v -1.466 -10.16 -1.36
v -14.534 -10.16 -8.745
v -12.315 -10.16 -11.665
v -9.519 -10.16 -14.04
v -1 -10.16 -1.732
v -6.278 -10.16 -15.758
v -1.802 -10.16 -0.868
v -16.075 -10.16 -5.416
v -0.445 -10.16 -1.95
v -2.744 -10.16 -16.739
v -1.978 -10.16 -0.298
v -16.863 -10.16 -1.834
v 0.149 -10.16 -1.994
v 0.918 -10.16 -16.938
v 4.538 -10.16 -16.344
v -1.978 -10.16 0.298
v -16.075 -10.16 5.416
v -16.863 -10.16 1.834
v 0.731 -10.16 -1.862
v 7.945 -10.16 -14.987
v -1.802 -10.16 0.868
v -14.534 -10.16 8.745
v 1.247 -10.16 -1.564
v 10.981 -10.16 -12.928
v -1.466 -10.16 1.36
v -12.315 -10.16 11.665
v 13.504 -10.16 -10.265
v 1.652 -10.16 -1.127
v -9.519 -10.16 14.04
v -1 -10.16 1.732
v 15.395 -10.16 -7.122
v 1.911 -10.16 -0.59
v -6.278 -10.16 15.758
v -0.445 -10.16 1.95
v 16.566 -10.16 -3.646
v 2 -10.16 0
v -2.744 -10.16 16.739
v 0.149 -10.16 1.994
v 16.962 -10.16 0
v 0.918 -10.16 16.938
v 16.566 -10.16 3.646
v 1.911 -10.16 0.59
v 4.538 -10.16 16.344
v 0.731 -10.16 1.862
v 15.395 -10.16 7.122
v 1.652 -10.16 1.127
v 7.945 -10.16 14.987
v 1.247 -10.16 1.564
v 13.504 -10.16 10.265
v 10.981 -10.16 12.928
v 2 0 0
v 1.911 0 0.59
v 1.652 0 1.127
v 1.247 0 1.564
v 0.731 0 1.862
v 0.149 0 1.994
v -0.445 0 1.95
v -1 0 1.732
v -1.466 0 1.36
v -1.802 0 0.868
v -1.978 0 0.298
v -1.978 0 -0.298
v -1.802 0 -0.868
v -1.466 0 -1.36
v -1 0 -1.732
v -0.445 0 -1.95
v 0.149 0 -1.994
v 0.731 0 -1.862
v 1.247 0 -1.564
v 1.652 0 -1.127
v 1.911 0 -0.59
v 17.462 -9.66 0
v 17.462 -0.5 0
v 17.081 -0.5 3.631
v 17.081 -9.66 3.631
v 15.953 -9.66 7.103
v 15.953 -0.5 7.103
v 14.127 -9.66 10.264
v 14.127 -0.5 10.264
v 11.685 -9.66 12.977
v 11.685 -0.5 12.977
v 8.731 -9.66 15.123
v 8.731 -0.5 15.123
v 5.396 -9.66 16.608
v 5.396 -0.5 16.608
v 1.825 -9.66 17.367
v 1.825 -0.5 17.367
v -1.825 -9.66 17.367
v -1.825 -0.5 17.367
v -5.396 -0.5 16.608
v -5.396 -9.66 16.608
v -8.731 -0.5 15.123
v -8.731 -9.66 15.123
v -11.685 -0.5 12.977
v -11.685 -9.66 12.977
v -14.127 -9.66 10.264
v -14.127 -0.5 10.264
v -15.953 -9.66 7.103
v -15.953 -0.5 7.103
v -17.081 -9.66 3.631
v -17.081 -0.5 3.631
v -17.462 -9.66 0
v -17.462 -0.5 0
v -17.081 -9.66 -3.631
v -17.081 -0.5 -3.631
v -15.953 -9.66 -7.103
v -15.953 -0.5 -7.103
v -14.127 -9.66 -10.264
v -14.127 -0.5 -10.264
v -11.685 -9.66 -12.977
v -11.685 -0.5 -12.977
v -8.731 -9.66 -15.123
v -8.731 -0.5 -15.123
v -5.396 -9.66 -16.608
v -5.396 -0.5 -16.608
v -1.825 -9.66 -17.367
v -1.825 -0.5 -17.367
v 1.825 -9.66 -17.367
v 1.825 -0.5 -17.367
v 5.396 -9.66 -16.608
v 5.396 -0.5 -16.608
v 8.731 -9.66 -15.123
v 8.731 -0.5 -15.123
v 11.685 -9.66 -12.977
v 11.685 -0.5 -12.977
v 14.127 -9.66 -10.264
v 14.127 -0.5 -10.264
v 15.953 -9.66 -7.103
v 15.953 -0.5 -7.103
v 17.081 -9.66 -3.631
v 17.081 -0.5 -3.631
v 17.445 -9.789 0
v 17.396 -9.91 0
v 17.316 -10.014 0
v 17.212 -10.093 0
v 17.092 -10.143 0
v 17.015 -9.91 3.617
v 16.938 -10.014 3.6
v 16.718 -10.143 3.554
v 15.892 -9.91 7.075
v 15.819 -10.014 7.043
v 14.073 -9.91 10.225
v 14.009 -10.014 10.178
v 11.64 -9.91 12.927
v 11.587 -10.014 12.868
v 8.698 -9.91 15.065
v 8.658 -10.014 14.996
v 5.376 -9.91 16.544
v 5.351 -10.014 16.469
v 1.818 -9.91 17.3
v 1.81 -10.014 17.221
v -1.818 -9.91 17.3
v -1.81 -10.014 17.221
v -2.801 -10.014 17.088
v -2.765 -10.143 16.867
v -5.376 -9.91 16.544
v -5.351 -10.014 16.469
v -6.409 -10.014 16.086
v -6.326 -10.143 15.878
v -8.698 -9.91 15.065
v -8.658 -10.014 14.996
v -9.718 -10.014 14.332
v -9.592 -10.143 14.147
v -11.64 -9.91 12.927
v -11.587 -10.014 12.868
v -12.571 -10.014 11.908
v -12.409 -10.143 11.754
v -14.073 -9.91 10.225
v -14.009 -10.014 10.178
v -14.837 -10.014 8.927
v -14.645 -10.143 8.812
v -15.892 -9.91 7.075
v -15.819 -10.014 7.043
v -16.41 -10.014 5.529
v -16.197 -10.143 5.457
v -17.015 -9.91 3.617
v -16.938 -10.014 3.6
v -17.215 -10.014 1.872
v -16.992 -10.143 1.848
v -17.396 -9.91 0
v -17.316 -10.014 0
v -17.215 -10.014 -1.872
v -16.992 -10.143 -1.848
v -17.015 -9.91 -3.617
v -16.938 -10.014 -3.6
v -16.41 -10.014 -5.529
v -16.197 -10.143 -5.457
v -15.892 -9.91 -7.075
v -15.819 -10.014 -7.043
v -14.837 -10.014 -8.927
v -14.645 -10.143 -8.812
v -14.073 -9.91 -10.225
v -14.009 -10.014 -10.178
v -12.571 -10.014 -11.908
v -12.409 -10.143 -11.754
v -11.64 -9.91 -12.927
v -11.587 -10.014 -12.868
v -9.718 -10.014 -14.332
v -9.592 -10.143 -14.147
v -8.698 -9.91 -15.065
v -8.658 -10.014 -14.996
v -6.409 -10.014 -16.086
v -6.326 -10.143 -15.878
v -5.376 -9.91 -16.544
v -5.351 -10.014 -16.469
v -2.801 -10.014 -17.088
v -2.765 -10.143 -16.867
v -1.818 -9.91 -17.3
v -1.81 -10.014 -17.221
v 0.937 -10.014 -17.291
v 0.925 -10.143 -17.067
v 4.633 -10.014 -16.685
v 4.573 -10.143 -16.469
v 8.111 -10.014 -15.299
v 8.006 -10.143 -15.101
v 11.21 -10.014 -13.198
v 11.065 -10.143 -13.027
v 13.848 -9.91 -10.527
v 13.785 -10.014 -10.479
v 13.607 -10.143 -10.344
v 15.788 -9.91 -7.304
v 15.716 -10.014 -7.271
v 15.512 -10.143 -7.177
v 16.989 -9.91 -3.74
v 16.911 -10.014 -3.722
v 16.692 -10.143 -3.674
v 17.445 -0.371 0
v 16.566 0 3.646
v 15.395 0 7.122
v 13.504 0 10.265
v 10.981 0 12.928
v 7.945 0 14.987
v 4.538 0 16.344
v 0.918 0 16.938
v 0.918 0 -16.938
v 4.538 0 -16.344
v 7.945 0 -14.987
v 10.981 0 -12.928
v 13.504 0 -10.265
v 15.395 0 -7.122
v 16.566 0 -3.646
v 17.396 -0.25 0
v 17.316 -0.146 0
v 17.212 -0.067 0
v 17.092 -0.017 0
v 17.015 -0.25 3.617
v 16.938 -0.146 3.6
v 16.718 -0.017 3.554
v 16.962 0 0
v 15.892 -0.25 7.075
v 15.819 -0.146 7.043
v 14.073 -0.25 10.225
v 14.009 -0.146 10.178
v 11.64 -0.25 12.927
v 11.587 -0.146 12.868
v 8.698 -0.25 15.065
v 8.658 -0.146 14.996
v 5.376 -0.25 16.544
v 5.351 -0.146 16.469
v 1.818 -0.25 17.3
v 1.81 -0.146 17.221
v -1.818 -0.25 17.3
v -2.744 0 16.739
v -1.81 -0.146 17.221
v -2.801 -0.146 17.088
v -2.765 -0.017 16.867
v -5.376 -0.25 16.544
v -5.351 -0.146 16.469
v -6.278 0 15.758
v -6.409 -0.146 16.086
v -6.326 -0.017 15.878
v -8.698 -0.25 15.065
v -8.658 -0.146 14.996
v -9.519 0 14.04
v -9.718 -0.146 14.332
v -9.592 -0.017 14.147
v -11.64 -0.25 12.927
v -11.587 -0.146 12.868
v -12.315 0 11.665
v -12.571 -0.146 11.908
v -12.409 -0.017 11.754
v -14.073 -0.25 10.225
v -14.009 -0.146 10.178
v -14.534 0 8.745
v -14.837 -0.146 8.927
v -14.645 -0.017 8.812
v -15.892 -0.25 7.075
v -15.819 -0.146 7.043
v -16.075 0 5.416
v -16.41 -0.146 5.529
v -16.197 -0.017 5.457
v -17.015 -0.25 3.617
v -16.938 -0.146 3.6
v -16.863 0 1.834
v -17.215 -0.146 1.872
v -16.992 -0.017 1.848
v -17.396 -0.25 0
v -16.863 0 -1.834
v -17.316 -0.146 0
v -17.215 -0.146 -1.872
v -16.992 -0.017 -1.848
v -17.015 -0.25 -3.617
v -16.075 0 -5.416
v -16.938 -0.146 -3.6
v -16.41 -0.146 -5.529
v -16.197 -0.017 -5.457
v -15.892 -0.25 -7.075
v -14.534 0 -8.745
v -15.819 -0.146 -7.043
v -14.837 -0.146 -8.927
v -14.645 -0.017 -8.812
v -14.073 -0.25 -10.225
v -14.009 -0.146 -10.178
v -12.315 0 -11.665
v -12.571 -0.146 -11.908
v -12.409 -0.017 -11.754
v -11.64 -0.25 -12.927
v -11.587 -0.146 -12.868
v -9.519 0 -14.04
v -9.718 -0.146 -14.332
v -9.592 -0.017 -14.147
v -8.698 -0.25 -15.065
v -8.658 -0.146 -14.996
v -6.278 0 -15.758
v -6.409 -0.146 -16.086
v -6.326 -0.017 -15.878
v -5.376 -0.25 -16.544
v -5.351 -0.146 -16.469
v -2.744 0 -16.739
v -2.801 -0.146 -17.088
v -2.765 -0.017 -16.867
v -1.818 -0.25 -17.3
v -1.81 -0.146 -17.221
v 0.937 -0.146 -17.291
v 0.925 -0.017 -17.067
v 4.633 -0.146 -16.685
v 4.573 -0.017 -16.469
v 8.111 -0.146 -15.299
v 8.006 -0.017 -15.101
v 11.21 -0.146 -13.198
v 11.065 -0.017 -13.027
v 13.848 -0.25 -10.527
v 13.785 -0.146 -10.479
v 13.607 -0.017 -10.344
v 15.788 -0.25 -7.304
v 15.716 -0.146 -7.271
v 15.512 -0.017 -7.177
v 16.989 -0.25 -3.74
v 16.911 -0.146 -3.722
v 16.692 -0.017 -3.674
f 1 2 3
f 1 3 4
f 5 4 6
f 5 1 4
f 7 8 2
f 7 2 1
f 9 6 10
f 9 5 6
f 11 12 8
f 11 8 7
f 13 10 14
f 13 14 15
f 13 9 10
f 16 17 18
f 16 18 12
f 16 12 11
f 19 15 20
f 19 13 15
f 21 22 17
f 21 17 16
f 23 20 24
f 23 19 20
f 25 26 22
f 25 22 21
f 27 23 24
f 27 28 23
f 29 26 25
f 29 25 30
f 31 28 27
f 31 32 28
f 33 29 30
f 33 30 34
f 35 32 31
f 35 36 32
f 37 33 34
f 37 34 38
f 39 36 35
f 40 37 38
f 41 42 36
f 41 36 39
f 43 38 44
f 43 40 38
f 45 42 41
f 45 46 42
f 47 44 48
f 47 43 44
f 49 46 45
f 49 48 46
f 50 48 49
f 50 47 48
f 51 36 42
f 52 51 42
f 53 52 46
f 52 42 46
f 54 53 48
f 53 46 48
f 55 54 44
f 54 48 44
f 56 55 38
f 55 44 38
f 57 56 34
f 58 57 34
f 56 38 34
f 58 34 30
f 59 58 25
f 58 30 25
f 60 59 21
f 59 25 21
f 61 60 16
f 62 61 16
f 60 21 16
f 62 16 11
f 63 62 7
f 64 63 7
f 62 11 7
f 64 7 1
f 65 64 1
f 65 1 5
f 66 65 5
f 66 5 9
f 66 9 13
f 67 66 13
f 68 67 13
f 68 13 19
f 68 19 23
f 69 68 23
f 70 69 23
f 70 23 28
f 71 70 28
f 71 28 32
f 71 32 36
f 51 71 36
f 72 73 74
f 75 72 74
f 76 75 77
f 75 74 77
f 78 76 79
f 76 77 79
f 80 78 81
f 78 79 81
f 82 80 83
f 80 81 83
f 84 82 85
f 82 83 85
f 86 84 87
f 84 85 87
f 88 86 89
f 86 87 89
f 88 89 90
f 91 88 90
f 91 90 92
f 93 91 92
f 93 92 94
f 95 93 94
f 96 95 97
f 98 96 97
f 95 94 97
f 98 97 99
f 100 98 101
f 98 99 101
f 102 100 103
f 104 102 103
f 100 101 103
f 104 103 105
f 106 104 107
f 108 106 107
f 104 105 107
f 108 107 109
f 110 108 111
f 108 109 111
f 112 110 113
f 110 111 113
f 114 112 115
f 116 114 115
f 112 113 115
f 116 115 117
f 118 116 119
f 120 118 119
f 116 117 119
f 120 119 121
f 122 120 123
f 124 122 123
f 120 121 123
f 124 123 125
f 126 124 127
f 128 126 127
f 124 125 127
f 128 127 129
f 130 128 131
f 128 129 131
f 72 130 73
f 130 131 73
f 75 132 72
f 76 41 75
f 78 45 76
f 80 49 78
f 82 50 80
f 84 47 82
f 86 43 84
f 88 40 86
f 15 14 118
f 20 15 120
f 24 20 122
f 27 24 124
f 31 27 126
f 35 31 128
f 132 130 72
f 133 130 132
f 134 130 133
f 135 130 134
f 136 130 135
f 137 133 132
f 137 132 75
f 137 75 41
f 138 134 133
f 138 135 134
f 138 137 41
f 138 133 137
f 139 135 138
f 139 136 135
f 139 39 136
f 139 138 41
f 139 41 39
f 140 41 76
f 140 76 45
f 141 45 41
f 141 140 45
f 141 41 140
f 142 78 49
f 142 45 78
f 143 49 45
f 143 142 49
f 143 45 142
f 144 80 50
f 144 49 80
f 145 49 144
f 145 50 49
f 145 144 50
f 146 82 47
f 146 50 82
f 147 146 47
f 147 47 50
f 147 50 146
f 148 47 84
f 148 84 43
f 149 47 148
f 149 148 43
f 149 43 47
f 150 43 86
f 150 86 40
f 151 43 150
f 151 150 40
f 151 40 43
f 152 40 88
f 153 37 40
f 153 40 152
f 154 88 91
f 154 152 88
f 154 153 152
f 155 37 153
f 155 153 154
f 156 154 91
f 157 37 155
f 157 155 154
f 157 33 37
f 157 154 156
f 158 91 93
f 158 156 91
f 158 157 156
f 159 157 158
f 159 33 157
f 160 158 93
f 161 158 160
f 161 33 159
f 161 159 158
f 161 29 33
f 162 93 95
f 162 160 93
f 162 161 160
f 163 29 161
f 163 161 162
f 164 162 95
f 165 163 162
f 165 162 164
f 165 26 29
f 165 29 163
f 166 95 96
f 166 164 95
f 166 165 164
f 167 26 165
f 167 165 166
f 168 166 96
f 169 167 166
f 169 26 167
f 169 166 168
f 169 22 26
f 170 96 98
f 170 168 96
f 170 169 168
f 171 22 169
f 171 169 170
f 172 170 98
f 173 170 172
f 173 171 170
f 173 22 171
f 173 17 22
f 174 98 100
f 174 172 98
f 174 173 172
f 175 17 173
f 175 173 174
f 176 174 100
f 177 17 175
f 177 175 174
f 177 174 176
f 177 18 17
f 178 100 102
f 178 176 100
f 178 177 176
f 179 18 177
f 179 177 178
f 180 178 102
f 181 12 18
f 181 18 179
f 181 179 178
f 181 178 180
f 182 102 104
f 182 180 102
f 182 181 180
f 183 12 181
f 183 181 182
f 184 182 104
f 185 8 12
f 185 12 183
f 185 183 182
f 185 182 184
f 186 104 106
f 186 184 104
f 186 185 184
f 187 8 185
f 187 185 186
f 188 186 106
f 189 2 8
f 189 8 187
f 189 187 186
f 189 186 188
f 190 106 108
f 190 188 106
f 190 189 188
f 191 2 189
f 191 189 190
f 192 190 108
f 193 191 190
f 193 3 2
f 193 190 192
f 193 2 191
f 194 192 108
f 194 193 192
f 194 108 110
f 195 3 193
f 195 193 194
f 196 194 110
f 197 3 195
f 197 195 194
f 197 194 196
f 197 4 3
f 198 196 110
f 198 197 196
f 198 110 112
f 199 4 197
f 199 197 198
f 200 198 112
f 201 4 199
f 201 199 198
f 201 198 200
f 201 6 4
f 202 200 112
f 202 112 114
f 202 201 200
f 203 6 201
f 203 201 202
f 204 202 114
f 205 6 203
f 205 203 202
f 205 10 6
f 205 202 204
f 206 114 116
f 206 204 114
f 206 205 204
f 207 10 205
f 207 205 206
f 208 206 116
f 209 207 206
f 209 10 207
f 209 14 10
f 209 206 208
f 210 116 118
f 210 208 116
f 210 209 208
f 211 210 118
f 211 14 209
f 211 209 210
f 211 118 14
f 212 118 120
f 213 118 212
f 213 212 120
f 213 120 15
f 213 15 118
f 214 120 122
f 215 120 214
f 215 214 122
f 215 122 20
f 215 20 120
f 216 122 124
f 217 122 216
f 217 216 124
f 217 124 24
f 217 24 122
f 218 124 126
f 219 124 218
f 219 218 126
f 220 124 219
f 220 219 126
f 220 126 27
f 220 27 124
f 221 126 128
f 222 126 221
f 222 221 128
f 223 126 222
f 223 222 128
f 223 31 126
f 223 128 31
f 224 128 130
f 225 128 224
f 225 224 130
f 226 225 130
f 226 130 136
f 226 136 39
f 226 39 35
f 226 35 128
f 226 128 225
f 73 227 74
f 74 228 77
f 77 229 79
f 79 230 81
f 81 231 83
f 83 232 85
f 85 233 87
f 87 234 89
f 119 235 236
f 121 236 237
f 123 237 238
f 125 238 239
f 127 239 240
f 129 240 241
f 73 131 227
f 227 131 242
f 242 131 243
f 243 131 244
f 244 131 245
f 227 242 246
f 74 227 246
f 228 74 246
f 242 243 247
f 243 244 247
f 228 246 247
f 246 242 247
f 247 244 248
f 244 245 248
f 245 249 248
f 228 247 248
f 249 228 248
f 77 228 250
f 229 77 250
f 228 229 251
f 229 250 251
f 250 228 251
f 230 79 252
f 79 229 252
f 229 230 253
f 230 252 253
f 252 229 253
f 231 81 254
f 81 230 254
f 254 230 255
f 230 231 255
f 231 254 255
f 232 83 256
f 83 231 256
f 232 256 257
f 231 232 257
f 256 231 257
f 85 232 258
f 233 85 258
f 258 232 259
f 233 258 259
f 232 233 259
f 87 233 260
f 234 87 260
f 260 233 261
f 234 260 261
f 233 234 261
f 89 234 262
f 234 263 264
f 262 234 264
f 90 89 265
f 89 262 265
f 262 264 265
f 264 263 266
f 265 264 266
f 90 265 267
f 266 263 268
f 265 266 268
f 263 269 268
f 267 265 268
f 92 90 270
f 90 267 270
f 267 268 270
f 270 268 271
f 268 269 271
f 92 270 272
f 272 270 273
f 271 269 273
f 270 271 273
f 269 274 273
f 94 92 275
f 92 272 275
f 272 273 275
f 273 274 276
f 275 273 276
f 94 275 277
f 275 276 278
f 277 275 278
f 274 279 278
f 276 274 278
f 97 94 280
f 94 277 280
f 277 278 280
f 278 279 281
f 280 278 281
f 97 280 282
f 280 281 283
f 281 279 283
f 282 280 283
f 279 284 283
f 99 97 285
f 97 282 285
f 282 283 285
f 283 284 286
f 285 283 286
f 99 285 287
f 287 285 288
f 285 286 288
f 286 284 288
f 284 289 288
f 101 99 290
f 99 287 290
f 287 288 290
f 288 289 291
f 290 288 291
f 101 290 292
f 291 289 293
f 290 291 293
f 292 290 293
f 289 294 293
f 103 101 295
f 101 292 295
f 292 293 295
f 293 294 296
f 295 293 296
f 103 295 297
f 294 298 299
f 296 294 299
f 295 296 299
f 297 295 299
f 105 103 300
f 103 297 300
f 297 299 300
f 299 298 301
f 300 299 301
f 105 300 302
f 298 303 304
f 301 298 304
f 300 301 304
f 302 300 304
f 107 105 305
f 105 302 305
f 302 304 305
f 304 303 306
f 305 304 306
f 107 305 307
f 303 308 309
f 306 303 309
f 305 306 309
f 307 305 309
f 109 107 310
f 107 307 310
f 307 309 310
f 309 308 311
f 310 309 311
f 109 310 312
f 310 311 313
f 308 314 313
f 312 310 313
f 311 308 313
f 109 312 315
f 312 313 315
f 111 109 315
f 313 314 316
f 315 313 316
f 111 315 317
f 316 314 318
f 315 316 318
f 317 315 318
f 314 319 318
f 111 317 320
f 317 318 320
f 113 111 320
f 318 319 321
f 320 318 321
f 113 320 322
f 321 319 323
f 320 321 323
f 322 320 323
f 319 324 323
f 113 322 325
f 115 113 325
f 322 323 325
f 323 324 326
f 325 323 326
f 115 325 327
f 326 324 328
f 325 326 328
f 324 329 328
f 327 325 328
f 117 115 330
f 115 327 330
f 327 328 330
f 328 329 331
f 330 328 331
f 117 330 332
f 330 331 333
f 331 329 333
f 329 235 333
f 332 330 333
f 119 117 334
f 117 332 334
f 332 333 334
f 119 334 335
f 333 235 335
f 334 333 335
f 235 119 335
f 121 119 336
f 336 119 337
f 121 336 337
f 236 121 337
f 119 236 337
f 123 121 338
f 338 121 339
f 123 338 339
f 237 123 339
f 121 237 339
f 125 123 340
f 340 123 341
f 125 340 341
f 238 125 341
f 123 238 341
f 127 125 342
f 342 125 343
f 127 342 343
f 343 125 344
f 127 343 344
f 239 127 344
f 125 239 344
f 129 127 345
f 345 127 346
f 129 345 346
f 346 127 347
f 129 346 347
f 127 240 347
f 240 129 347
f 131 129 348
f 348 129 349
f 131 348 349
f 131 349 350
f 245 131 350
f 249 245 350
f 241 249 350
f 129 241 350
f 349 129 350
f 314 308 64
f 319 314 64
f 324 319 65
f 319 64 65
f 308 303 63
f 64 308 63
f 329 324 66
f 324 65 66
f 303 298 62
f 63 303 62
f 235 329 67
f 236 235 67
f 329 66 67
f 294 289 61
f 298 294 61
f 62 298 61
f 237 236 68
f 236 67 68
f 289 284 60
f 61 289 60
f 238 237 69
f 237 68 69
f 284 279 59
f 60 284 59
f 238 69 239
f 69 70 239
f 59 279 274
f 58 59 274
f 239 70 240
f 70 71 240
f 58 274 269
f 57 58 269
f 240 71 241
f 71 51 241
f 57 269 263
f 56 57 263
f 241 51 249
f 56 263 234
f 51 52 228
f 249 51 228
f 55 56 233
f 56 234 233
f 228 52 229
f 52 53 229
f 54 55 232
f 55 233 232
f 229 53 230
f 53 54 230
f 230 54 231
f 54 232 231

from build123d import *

# Parameters (mm, degrees)
F0_R     = 17.4625
F1_DEPTH = 10.16
F2_R     = 2
F3_DEPTH = 25.4
F4_R     = 0.5


with BuildPart() as f1:
    # F0 (on Front) → F1 (new body)
    with BuildSketch(Plane.XZ):
        Circle(F0_R)
    extrude(amount=F1_DEPTH)

    # F2 (on face) → F3 (cut)
    with BuildSketch(Plane.XZ.offset(10.16)):
        Circle(F2_R)
    extrude(amount=-F3_DEPTH, mode=Mode.SUBTRACT)

    # F4
    f4_edges = [f1.edges().sort_by_distance(p)[0] for p in [
        (-17.4625, -10.16, 0),
        (-17.4625, 0, 0),
    ]]
    fillet(f4_edges, radius=F4_R)


solid = f1.part
